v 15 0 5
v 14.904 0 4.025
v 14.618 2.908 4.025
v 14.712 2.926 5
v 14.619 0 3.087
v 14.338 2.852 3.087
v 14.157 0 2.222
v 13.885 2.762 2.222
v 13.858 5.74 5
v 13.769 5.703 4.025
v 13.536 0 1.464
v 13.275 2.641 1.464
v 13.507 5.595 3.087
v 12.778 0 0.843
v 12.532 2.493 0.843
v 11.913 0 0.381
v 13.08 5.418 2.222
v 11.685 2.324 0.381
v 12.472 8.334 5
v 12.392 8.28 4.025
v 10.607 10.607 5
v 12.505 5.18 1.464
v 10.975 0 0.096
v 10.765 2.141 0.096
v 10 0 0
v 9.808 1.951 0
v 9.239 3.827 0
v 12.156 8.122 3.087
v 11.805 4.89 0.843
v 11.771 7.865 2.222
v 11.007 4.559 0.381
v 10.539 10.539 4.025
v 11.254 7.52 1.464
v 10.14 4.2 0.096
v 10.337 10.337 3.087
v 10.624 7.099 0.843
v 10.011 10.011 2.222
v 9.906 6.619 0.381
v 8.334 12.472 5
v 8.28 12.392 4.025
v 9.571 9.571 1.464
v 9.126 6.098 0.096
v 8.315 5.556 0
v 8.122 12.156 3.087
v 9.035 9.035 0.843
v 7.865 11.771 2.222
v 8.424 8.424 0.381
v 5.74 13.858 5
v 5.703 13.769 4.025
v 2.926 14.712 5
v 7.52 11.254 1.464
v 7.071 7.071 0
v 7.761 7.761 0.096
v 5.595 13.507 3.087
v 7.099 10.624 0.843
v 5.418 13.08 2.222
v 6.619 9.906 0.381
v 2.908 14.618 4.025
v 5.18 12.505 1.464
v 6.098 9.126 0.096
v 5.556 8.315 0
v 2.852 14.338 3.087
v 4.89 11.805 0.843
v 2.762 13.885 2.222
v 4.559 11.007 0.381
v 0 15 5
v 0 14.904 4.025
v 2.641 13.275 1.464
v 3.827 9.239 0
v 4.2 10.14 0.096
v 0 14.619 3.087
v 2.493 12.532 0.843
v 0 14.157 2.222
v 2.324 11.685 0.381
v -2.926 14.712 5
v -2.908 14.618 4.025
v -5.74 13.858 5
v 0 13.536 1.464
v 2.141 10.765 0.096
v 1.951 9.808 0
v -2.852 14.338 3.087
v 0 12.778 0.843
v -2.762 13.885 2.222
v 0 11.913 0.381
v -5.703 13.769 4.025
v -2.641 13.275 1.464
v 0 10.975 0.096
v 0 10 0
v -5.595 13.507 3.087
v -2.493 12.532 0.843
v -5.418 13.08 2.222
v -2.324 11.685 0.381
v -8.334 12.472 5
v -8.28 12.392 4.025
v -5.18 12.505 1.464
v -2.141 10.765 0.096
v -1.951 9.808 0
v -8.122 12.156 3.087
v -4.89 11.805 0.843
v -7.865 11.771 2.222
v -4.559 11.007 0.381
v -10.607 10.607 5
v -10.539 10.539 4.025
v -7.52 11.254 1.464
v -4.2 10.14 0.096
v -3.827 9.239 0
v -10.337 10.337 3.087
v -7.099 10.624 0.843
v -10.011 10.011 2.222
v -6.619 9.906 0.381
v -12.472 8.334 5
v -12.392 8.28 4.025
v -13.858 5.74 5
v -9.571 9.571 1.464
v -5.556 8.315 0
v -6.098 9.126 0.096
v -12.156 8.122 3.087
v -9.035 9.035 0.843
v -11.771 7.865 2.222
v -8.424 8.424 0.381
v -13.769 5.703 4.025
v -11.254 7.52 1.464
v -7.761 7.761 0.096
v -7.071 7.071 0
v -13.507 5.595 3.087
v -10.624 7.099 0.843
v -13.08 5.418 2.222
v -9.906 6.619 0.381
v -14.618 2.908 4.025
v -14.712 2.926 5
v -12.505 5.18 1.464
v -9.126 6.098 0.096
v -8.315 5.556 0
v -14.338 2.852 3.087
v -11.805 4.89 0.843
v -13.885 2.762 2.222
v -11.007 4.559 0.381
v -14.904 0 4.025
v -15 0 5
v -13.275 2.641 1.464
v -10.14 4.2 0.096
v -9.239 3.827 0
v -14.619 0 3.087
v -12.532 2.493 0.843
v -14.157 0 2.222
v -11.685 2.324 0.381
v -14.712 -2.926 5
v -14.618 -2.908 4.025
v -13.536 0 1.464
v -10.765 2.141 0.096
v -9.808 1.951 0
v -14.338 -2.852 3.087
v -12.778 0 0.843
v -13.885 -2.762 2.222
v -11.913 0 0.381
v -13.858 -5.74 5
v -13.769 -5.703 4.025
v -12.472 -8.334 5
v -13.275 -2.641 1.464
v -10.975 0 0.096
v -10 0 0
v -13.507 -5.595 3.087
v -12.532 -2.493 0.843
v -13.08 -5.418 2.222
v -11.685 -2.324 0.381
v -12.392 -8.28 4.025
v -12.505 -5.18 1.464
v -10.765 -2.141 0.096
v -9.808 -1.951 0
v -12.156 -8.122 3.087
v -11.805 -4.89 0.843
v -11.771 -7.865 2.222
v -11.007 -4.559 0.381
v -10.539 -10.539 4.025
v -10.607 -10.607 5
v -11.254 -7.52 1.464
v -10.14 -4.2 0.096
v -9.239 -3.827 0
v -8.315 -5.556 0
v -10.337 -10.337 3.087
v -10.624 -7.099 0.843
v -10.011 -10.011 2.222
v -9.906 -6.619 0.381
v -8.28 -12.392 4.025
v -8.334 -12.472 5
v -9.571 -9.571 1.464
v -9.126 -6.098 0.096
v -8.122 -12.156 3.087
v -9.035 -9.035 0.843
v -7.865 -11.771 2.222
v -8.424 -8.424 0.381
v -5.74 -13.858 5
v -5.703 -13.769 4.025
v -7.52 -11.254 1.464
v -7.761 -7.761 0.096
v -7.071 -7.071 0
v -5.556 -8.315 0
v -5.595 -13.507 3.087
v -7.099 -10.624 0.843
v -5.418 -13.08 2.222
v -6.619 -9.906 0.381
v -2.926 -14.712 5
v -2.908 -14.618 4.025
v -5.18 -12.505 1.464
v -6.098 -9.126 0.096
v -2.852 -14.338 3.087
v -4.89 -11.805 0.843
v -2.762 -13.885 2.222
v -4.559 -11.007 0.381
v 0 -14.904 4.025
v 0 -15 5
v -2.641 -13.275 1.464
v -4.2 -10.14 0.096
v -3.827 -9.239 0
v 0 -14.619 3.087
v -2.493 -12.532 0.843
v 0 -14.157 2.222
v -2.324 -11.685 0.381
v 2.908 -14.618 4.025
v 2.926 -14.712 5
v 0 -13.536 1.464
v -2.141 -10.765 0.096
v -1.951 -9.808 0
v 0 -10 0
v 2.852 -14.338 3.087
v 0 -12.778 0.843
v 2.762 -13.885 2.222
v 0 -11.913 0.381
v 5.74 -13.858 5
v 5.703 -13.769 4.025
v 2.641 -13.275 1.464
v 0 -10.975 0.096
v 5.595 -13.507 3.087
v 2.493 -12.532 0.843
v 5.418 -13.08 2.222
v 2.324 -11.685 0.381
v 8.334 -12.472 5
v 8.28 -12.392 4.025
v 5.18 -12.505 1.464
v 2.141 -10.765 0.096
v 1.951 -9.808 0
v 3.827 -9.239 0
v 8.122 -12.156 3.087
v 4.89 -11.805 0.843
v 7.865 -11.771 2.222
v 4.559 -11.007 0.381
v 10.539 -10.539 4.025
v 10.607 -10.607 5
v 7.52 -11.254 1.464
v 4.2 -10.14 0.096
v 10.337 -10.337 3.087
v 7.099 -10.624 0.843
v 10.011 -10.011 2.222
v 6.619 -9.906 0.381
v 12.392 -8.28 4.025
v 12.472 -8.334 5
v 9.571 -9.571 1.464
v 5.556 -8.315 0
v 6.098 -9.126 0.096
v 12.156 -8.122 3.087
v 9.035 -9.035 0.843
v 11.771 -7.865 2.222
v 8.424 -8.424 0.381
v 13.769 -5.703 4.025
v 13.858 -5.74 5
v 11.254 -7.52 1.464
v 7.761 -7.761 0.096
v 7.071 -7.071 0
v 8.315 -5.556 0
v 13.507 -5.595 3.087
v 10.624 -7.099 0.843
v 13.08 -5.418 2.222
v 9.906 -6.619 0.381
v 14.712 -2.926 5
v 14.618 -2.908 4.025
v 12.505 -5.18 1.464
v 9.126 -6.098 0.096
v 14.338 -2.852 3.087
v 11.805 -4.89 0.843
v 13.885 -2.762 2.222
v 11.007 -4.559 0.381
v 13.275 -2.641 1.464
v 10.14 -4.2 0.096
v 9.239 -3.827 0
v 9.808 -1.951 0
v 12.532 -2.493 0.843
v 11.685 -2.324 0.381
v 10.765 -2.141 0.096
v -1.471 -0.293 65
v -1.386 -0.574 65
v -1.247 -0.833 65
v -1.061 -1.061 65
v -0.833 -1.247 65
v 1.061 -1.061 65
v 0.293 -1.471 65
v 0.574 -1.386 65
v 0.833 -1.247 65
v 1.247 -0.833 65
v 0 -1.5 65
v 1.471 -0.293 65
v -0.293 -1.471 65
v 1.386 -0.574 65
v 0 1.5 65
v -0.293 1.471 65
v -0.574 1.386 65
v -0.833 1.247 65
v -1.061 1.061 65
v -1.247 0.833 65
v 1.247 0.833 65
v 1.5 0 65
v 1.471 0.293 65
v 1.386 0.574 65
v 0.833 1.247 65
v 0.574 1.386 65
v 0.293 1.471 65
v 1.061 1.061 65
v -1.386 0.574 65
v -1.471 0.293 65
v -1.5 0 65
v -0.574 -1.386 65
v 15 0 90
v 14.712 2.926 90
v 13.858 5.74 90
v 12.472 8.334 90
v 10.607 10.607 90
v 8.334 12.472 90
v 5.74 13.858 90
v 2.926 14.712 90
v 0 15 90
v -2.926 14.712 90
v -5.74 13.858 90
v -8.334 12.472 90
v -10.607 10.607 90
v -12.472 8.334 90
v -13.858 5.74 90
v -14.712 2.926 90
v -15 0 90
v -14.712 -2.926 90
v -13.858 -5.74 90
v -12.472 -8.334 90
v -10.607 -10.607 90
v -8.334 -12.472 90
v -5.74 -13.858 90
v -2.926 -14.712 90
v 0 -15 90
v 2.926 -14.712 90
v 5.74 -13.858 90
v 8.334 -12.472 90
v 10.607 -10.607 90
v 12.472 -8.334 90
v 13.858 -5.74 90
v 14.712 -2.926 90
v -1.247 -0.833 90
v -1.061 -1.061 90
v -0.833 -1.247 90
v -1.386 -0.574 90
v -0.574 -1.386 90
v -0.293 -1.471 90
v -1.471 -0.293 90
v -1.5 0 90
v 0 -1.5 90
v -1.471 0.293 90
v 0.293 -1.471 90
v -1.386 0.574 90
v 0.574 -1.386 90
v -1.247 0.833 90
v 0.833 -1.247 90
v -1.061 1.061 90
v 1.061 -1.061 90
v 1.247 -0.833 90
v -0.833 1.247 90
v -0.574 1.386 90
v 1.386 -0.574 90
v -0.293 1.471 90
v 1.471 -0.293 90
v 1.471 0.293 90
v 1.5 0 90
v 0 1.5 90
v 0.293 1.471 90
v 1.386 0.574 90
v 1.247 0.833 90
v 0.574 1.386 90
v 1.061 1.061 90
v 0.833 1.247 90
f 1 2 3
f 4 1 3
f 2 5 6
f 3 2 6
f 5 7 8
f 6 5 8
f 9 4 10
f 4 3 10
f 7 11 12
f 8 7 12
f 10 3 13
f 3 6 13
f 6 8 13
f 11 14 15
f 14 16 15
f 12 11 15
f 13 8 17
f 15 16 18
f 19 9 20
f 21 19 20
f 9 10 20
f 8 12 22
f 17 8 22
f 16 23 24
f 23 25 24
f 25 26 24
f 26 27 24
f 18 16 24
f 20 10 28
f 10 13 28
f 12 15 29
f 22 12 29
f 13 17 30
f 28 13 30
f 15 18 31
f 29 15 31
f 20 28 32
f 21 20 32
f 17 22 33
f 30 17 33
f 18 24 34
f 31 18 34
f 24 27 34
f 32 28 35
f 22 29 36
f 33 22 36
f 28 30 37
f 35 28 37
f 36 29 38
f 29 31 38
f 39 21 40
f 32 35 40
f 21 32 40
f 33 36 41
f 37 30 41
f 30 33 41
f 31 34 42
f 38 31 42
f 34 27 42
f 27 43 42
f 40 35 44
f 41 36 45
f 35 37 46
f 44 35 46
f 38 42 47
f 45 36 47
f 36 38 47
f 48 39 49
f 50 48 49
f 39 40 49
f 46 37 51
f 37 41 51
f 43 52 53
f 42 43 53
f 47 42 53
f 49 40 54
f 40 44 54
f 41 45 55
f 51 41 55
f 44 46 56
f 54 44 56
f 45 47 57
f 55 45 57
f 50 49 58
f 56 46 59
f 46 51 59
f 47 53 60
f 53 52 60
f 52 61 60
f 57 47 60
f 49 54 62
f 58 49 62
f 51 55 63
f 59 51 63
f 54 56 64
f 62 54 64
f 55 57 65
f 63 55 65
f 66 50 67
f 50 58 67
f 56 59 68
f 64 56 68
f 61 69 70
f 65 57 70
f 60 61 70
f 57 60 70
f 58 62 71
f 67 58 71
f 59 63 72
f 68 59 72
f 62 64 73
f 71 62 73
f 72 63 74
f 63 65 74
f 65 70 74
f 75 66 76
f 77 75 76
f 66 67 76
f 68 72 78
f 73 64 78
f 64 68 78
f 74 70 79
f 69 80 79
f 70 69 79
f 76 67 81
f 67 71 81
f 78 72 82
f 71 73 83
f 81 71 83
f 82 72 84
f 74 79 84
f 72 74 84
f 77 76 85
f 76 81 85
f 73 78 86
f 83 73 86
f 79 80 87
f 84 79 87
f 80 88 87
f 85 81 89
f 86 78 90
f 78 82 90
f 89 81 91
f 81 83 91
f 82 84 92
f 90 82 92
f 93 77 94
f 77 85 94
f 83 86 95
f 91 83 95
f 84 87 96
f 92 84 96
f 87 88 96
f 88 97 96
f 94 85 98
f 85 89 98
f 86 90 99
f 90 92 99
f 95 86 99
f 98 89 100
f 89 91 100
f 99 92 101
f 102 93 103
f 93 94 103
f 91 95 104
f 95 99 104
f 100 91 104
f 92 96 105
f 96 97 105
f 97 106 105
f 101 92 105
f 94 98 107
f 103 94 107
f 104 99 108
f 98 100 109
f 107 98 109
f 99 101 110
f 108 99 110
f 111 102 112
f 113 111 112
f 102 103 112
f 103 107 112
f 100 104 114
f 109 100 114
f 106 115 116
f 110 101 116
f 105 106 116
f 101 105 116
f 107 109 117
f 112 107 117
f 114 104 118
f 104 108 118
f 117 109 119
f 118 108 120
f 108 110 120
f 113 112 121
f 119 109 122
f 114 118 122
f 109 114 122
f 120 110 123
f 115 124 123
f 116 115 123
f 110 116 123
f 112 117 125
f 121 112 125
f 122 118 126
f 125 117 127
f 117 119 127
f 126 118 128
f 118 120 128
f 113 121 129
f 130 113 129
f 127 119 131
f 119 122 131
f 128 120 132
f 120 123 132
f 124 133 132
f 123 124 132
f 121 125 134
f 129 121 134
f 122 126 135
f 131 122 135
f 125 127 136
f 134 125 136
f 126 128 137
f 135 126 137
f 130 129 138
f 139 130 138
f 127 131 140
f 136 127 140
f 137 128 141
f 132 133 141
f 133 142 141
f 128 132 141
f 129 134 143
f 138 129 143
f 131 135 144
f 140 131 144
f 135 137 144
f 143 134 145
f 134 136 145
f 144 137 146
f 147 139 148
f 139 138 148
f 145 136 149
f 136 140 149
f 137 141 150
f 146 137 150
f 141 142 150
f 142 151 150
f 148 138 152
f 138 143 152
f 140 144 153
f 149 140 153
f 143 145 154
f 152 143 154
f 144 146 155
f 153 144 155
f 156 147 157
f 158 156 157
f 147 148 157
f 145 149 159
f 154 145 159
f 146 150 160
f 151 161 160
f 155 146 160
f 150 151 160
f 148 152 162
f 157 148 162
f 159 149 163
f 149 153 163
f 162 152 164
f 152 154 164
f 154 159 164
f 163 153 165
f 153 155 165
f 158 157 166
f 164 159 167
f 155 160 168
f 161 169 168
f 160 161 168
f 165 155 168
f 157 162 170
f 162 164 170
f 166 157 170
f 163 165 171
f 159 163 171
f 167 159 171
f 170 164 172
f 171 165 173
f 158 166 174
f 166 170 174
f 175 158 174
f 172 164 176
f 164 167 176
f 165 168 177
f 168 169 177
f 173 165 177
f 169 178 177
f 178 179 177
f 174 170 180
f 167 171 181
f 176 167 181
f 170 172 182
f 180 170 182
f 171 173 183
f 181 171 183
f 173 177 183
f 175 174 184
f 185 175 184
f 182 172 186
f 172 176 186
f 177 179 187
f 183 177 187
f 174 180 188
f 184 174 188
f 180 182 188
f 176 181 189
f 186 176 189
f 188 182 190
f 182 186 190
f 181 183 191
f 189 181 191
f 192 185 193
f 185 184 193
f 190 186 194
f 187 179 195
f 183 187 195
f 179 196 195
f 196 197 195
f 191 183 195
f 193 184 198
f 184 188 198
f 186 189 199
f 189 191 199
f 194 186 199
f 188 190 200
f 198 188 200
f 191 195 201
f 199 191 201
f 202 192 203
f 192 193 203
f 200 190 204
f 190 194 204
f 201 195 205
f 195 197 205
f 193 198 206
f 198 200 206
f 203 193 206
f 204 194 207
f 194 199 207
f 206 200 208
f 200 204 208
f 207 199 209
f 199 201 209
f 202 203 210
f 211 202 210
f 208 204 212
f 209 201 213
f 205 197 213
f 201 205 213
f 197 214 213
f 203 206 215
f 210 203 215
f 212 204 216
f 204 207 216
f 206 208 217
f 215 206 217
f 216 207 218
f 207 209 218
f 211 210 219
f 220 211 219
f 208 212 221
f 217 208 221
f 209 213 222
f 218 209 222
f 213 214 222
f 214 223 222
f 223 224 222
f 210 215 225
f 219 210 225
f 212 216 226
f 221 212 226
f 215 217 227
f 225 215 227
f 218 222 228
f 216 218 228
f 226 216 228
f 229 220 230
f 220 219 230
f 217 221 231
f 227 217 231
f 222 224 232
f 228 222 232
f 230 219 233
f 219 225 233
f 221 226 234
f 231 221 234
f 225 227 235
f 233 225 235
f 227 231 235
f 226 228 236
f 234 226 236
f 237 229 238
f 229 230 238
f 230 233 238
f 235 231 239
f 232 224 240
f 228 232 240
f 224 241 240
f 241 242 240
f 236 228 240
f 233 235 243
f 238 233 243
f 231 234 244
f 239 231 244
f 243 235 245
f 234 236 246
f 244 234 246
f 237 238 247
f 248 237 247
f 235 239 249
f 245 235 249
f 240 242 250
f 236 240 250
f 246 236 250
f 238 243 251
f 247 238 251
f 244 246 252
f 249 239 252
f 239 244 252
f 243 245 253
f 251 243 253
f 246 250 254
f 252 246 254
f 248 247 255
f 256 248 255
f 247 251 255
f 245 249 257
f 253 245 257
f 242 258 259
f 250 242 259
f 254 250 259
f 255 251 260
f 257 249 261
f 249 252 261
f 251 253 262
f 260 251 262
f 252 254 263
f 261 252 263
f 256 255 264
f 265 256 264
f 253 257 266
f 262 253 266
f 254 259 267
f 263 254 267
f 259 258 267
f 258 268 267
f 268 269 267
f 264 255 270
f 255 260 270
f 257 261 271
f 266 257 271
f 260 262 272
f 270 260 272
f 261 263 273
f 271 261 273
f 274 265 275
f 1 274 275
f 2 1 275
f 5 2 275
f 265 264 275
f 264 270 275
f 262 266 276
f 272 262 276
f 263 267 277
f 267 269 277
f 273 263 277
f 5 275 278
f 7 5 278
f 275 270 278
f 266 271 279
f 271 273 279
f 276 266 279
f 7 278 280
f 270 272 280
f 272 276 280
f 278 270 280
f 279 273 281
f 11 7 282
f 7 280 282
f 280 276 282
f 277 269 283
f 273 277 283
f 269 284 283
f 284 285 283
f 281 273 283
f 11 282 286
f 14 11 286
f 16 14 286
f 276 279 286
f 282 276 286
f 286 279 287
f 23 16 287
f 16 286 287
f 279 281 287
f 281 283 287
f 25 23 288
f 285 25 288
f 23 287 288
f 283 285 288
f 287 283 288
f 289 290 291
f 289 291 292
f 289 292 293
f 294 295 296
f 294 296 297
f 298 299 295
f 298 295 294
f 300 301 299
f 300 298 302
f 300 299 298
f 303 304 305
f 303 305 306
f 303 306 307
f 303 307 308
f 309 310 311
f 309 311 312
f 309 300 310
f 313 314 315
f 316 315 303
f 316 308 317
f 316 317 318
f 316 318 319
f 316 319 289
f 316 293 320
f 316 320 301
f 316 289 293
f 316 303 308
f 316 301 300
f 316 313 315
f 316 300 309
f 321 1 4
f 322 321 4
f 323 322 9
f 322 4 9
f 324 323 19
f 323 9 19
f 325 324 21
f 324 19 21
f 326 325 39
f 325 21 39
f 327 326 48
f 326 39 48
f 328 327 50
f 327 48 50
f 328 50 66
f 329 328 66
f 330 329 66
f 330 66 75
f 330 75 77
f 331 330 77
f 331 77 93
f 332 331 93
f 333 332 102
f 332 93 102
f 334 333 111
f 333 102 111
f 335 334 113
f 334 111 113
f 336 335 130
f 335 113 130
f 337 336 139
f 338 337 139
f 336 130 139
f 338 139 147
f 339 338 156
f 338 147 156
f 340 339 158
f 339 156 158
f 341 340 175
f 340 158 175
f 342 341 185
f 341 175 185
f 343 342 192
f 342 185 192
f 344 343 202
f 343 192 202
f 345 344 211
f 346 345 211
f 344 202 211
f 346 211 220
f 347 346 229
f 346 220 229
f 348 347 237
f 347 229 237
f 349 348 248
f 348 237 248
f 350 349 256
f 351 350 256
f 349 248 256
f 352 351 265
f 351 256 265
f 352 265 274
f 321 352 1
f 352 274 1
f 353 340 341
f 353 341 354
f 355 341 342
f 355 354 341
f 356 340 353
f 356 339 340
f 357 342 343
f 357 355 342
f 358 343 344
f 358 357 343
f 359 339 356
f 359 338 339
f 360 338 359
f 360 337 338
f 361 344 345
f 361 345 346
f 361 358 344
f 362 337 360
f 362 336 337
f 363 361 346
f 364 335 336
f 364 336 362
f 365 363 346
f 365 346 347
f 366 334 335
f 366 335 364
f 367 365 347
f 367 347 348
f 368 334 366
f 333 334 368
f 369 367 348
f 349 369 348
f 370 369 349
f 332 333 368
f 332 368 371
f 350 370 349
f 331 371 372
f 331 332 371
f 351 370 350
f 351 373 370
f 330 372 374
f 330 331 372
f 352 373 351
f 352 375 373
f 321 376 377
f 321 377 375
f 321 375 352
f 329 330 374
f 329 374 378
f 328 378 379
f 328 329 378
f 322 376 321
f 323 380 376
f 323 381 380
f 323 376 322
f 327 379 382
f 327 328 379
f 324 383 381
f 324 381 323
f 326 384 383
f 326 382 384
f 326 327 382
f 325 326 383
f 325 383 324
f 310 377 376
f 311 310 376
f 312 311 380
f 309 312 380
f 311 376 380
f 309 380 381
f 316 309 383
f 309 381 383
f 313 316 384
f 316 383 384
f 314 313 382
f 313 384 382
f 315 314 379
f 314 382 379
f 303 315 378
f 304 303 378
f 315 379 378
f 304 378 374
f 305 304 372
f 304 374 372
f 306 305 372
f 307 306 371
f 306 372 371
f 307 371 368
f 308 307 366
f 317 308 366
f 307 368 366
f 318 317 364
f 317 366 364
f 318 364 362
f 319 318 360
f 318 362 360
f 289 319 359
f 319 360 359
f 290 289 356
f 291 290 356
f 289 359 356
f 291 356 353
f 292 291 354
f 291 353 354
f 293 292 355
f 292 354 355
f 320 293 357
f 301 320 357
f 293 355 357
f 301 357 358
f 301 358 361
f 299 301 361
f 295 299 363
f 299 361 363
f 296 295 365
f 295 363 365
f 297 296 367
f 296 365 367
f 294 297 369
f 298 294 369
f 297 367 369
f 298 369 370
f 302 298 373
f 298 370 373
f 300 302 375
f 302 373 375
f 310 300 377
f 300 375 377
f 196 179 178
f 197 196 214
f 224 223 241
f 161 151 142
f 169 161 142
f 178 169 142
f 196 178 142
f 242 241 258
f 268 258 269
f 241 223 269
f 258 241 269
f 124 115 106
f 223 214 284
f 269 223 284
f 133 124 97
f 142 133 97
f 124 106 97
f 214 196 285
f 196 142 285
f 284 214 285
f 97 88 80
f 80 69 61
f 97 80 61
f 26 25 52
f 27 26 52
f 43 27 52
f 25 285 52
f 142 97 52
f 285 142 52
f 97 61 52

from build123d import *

# Parameters (mm, degrees)
F0_R     = 15
F1_DEPTH = 90
F2_R     = 1.5
F3_DEPTH = 25
F4_R     = 5


with BuildPart() as f1:
    # F0 (on Top) → F1 (new body)
    with BuildSketch(Plane.XY):
        Circle(F0_R)
    extrude(amount=F1_DEPTH)

    # F2 (on face) → F3 (cut)
    with BuildSketch(Plane.XY.offset(90)):
        Circle(F2_R)
    extrude(amount=-F3_DEPTH, mode=Mode.SUBTRACT)

    # F4
    f4_edges = [f1.edges().sort_by_distance(p)[0] for p in [
        (-15, 0, 0),
    ]]
    fillet(f4_edges, radius=F4_R)


solid = f1.part
